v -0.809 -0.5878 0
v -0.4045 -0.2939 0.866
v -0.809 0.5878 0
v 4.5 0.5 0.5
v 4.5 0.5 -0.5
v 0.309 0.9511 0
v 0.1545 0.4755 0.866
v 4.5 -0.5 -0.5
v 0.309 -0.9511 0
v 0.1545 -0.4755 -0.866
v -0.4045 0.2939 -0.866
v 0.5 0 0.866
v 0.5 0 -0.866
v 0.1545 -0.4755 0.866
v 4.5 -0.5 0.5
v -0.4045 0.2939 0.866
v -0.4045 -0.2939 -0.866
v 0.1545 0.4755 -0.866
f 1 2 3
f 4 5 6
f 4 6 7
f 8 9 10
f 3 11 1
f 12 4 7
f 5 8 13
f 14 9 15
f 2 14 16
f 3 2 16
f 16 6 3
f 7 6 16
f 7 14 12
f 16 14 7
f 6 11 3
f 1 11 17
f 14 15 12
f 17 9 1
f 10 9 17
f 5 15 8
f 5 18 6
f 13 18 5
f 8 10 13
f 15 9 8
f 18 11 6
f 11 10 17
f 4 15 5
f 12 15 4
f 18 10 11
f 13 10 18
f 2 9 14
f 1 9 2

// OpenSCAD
Premier_objet = "sphere";//[sphere,cube]
Deuxieme_objet = "cube";//[sphere,cube]
hull()
{
    if(Premier_objet=="cube"){
        cube(center=true);}
    
    if(Premier_objet=="sphere"){
        sphere();}
    
    translate([4,0,0])
    {
        if(Deuxieme_objet=="cube"){
            cube(center=true);}
    
        if(Deuxieme_objet=="sphere"){
            sphere();}
    }
}
